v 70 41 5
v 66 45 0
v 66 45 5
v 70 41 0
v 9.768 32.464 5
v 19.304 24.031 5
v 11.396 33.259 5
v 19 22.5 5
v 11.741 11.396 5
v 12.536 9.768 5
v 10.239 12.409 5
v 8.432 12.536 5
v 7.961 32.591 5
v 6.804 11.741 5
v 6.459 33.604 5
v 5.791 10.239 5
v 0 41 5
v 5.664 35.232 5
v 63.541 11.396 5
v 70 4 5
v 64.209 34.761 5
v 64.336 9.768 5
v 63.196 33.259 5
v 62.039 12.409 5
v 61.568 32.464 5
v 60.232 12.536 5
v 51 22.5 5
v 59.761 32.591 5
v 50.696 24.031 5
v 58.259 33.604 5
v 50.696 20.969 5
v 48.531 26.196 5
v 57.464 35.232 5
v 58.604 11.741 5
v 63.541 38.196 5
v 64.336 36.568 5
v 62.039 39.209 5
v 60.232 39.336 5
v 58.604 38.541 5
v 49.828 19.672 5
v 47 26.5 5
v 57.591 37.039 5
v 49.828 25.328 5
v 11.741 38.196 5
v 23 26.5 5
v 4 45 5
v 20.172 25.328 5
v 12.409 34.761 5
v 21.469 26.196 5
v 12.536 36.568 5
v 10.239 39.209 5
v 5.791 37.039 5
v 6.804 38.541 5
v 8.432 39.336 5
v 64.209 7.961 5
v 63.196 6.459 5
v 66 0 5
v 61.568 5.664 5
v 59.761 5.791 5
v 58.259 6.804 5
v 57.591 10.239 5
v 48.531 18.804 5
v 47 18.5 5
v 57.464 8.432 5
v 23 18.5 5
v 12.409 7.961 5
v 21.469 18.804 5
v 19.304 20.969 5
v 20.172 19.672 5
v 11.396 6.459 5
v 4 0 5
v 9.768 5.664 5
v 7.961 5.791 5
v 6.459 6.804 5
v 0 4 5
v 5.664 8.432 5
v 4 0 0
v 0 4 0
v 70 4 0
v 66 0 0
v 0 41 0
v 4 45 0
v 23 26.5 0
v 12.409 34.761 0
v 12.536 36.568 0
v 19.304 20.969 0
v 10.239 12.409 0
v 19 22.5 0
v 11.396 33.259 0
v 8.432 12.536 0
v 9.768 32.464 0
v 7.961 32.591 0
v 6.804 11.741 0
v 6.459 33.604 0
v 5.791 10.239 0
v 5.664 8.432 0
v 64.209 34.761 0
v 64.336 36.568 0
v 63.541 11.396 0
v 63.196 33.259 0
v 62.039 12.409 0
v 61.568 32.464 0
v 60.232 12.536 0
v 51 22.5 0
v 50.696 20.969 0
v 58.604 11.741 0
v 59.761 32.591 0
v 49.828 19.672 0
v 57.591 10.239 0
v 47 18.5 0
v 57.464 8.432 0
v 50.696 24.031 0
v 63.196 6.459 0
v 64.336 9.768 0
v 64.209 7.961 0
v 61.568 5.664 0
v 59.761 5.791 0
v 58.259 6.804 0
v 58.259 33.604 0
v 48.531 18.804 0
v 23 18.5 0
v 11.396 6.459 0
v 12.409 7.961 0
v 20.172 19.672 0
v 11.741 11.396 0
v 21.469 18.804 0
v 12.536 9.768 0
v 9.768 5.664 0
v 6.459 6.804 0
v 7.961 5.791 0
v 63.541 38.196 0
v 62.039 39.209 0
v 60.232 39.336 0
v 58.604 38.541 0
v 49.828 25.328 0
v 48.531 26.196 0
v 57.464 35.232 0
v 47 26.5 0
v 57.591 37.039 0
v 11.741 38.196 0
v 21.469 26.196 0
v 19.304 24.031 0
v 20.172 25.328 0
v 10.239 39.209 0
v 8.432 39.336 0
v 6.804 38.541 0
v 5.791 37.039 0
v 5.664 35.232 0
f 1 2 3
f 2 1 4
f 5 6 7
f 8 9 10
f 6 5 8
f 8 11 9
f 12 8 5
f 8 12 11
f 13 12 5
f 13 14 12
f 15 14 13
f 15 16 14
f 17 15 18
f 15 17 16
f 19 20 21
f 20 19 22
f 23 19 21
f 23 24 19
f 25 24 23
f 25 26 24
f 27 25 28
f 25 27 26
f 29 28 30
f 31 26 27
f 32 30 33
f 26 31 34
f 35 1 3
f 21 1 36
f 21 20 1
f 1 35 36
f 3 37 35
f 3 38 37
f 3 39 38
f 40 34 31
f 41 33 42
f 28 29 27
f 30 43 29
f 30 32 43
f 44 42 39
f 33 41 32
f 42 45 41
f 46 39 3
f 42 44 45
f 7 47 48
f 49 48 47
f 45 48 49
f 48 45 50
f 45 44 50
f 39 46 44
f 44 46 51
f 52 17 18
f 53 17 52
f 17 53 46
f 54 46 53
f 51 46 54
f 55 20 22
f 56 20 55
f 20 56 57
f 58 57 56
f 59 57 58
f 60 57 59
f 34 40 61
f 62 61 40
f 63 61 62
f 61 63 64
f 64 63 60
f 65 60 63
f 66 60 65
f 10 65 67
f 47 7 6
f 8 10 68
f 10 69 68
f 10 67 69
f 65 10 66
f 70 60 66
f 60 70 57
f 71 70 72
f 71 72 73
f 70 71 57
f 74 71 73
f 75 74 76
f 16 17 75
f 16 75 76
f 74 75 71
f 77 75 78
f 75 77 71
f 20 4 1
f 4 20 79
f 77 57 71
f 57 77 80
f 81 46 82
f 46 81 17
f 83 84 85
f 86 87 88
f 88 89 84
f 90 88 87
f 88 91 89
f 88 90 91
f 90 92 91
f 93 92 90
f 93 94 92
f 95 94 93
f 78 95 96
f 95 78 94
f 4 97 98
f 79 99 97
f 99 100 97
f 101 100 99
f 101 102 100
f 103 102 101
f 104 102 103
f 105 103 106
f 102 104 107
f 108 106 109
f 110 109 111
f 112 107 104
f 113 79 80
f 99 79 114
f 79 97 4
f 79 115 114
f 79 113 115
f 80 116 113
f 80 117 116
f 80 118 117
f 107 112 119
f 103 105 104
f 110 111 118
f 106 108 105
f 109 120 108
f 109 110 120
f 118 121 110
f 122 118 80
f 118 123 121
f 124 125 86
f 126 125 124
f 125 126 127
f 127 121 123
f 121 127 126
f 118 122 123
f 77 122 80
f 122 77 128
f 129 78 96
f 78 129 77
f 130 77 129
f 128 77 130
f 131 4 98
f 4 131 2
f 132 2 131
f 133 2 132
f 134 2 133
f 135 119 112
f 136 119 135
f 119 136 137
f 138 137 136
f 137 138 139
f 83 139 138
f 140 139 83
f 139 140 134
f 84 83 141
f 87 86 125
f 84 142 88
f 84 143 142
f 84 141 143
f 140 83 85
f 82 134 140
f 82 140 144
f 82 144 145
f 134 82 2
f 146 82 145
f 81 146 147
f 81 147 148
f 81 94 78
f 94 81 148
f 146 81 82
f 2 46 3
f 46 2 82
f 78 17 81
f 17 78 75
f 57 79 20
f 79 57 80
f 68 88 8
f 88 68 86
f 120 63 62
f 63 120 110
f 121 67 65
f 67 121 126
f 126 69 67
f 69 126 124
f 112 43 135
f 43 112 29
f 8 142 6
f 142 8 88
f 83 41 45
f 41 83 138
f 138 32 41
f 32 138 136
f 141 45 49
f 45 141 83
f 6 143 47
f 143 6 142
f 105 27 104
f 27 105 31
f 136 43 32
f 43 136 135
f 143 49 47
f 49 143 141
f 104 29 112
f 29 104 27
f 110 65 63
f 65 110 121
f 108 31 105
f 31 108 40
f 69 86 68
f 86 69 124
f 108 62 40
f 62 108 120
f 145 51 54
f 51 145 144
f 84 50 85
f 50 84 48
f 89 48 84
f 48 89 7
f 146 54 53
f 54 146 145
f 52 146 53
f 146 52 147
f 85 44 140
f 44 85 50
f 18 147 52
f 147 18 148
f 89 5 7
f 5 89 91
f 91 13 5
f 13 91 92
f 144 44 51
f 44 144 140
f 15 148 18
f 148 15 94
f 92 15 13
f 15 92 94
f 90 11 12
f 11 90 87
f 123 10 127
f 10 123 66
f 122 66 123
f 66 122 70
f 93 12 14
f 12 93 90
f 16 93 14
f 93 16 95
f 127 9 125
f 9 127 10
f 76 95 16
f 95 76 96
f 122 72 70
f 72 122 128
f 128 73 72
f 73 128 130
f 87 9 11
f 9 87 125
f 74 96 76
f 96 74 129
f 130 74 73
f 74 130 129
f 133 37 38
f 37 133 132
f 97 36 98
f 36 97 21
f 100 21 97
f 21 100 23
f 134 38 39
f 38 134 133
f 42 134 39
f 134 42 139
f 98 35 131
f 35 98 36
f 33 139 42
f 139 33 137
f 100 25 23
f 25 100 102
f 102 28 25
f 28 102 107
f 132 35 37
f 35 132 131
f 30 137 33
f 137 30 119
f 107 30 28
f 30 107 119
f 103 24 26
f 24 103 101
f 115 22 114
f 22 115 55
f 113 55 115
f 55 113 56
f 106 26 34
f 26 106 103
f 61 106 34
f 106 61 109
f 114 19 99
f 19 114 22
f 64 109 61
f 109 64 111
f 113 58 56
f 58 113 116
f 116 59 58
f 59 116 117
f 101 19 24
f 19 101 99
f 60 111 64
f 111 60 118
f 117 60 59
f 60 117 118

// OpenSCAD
$fn = 32;

// ----------------------------------------------------------------------
// Bracket plate: slot plate 70 x 45
// ----------------------------------------------------------------------

// --- parameters (mm) ---
hole_r = 3.5;             // bolt hole radius
plate_t = 5;              // plate thickness, Z (extrusion height)
plate_l = 70;             // plate length
plate_w = 45;             // plate width
slot_l = 24;              // slot straight length
slot_r = 4;               // slot end radius

slot_len = slot_l + 2 * slot_r;
slot_w = 2 * slot_r;
hole_d2 = 2 * hole_r;

profile = [[4, 0], [66, 0], [70, 4], [70, 41], [66, 45], [4, 45], [0, 41], [0, 4]];  // primary outline, 8 points, counter clockwise
void_1 = [[47, 18.5], [48.531, 18.804], [49.828, 19.672], [50.696, 20.969], [51, 22.5], [50.696, 24.031], [49.828, 25.328], [48.531, 26.196], [47, 26.5], [23, 26.5], [21.469, 26.196], [20.172, 25.328], [19.304, 24.031], [19, 22.5], [19.304, 20.969], [20.172, 19.672], [21.469, 18.804], [23, 18.5]];  // grip slot, 18 points
void_2 = [[12.536, 36.568], [11.741, 38.196], [10.239, 39.209], [8.432, 39.336], [6.804, 38.541], [5.791, 37.039], [5.664, 35.232], [6.459, 33.604], [7.961, 32.591], [9.768, 32.464], [11.396, 33.259], [12.409, 34.761]];  // corner hole, 12 points
void_3 = [[12.536, 9.768], [11.741, 11.396], [10.239, 12.409], [8.432, 12.536], [6.804, 11.741], [5.791, 10.239], [5.664, 8.432], [6.459, 6.804], [7.961, 5.791], [9.768, 5.664], [11.396, 6.459], [12.409, 7.961]];  // corner hole, 12 points
void_4 = [[64.336, 36.568], [63.541, 38.196], [62.039, 39.209], [60.232, 39.336], [58.604, 38.541], [57.591, 37.039], [57.464, 35.232], [58.259, 33.604], [59.761, 32.591], [61.568, 32.464], [63.196, 33.259], [64.209, 34.761]];  // corner hole, 12 points
void_5 = [[64.336, 9.768], [63.541, 11.396], [62.039, 12.409], [60.232, 12.536], [58.604, 11.741], [57.591, 10.239], [57.464, 8.432], [58.259, 6.804], [59.761, 5.791], [61.568, 5.664], [63.196, 6.459], [64.209, 7.961]];  // corner hole, 12 points

// --- the one profile operation ---
difference() {
  linear_extrude(height = plate_t) polygon(points = profile);
  translate([0, 0, -1])
    linear_extrude(height = plate_t + 2) polygon(points = void_1);
  translate([0, 0, -1])
    linear_extrude(height = plate_t + 2) polygon(points = void_2);
  translate([0, 0, -1])
    linear_extrude(height = plate_t + 2) polygon(points = void_3);
  translate([0, 0, -1])
    linear_extrude(height = plate_t + 2) polygon(points = void_4);
  translate([0, 0, -1])
    linear_extrude(height = plate_t + 2) polygon(points = void_5);
}
